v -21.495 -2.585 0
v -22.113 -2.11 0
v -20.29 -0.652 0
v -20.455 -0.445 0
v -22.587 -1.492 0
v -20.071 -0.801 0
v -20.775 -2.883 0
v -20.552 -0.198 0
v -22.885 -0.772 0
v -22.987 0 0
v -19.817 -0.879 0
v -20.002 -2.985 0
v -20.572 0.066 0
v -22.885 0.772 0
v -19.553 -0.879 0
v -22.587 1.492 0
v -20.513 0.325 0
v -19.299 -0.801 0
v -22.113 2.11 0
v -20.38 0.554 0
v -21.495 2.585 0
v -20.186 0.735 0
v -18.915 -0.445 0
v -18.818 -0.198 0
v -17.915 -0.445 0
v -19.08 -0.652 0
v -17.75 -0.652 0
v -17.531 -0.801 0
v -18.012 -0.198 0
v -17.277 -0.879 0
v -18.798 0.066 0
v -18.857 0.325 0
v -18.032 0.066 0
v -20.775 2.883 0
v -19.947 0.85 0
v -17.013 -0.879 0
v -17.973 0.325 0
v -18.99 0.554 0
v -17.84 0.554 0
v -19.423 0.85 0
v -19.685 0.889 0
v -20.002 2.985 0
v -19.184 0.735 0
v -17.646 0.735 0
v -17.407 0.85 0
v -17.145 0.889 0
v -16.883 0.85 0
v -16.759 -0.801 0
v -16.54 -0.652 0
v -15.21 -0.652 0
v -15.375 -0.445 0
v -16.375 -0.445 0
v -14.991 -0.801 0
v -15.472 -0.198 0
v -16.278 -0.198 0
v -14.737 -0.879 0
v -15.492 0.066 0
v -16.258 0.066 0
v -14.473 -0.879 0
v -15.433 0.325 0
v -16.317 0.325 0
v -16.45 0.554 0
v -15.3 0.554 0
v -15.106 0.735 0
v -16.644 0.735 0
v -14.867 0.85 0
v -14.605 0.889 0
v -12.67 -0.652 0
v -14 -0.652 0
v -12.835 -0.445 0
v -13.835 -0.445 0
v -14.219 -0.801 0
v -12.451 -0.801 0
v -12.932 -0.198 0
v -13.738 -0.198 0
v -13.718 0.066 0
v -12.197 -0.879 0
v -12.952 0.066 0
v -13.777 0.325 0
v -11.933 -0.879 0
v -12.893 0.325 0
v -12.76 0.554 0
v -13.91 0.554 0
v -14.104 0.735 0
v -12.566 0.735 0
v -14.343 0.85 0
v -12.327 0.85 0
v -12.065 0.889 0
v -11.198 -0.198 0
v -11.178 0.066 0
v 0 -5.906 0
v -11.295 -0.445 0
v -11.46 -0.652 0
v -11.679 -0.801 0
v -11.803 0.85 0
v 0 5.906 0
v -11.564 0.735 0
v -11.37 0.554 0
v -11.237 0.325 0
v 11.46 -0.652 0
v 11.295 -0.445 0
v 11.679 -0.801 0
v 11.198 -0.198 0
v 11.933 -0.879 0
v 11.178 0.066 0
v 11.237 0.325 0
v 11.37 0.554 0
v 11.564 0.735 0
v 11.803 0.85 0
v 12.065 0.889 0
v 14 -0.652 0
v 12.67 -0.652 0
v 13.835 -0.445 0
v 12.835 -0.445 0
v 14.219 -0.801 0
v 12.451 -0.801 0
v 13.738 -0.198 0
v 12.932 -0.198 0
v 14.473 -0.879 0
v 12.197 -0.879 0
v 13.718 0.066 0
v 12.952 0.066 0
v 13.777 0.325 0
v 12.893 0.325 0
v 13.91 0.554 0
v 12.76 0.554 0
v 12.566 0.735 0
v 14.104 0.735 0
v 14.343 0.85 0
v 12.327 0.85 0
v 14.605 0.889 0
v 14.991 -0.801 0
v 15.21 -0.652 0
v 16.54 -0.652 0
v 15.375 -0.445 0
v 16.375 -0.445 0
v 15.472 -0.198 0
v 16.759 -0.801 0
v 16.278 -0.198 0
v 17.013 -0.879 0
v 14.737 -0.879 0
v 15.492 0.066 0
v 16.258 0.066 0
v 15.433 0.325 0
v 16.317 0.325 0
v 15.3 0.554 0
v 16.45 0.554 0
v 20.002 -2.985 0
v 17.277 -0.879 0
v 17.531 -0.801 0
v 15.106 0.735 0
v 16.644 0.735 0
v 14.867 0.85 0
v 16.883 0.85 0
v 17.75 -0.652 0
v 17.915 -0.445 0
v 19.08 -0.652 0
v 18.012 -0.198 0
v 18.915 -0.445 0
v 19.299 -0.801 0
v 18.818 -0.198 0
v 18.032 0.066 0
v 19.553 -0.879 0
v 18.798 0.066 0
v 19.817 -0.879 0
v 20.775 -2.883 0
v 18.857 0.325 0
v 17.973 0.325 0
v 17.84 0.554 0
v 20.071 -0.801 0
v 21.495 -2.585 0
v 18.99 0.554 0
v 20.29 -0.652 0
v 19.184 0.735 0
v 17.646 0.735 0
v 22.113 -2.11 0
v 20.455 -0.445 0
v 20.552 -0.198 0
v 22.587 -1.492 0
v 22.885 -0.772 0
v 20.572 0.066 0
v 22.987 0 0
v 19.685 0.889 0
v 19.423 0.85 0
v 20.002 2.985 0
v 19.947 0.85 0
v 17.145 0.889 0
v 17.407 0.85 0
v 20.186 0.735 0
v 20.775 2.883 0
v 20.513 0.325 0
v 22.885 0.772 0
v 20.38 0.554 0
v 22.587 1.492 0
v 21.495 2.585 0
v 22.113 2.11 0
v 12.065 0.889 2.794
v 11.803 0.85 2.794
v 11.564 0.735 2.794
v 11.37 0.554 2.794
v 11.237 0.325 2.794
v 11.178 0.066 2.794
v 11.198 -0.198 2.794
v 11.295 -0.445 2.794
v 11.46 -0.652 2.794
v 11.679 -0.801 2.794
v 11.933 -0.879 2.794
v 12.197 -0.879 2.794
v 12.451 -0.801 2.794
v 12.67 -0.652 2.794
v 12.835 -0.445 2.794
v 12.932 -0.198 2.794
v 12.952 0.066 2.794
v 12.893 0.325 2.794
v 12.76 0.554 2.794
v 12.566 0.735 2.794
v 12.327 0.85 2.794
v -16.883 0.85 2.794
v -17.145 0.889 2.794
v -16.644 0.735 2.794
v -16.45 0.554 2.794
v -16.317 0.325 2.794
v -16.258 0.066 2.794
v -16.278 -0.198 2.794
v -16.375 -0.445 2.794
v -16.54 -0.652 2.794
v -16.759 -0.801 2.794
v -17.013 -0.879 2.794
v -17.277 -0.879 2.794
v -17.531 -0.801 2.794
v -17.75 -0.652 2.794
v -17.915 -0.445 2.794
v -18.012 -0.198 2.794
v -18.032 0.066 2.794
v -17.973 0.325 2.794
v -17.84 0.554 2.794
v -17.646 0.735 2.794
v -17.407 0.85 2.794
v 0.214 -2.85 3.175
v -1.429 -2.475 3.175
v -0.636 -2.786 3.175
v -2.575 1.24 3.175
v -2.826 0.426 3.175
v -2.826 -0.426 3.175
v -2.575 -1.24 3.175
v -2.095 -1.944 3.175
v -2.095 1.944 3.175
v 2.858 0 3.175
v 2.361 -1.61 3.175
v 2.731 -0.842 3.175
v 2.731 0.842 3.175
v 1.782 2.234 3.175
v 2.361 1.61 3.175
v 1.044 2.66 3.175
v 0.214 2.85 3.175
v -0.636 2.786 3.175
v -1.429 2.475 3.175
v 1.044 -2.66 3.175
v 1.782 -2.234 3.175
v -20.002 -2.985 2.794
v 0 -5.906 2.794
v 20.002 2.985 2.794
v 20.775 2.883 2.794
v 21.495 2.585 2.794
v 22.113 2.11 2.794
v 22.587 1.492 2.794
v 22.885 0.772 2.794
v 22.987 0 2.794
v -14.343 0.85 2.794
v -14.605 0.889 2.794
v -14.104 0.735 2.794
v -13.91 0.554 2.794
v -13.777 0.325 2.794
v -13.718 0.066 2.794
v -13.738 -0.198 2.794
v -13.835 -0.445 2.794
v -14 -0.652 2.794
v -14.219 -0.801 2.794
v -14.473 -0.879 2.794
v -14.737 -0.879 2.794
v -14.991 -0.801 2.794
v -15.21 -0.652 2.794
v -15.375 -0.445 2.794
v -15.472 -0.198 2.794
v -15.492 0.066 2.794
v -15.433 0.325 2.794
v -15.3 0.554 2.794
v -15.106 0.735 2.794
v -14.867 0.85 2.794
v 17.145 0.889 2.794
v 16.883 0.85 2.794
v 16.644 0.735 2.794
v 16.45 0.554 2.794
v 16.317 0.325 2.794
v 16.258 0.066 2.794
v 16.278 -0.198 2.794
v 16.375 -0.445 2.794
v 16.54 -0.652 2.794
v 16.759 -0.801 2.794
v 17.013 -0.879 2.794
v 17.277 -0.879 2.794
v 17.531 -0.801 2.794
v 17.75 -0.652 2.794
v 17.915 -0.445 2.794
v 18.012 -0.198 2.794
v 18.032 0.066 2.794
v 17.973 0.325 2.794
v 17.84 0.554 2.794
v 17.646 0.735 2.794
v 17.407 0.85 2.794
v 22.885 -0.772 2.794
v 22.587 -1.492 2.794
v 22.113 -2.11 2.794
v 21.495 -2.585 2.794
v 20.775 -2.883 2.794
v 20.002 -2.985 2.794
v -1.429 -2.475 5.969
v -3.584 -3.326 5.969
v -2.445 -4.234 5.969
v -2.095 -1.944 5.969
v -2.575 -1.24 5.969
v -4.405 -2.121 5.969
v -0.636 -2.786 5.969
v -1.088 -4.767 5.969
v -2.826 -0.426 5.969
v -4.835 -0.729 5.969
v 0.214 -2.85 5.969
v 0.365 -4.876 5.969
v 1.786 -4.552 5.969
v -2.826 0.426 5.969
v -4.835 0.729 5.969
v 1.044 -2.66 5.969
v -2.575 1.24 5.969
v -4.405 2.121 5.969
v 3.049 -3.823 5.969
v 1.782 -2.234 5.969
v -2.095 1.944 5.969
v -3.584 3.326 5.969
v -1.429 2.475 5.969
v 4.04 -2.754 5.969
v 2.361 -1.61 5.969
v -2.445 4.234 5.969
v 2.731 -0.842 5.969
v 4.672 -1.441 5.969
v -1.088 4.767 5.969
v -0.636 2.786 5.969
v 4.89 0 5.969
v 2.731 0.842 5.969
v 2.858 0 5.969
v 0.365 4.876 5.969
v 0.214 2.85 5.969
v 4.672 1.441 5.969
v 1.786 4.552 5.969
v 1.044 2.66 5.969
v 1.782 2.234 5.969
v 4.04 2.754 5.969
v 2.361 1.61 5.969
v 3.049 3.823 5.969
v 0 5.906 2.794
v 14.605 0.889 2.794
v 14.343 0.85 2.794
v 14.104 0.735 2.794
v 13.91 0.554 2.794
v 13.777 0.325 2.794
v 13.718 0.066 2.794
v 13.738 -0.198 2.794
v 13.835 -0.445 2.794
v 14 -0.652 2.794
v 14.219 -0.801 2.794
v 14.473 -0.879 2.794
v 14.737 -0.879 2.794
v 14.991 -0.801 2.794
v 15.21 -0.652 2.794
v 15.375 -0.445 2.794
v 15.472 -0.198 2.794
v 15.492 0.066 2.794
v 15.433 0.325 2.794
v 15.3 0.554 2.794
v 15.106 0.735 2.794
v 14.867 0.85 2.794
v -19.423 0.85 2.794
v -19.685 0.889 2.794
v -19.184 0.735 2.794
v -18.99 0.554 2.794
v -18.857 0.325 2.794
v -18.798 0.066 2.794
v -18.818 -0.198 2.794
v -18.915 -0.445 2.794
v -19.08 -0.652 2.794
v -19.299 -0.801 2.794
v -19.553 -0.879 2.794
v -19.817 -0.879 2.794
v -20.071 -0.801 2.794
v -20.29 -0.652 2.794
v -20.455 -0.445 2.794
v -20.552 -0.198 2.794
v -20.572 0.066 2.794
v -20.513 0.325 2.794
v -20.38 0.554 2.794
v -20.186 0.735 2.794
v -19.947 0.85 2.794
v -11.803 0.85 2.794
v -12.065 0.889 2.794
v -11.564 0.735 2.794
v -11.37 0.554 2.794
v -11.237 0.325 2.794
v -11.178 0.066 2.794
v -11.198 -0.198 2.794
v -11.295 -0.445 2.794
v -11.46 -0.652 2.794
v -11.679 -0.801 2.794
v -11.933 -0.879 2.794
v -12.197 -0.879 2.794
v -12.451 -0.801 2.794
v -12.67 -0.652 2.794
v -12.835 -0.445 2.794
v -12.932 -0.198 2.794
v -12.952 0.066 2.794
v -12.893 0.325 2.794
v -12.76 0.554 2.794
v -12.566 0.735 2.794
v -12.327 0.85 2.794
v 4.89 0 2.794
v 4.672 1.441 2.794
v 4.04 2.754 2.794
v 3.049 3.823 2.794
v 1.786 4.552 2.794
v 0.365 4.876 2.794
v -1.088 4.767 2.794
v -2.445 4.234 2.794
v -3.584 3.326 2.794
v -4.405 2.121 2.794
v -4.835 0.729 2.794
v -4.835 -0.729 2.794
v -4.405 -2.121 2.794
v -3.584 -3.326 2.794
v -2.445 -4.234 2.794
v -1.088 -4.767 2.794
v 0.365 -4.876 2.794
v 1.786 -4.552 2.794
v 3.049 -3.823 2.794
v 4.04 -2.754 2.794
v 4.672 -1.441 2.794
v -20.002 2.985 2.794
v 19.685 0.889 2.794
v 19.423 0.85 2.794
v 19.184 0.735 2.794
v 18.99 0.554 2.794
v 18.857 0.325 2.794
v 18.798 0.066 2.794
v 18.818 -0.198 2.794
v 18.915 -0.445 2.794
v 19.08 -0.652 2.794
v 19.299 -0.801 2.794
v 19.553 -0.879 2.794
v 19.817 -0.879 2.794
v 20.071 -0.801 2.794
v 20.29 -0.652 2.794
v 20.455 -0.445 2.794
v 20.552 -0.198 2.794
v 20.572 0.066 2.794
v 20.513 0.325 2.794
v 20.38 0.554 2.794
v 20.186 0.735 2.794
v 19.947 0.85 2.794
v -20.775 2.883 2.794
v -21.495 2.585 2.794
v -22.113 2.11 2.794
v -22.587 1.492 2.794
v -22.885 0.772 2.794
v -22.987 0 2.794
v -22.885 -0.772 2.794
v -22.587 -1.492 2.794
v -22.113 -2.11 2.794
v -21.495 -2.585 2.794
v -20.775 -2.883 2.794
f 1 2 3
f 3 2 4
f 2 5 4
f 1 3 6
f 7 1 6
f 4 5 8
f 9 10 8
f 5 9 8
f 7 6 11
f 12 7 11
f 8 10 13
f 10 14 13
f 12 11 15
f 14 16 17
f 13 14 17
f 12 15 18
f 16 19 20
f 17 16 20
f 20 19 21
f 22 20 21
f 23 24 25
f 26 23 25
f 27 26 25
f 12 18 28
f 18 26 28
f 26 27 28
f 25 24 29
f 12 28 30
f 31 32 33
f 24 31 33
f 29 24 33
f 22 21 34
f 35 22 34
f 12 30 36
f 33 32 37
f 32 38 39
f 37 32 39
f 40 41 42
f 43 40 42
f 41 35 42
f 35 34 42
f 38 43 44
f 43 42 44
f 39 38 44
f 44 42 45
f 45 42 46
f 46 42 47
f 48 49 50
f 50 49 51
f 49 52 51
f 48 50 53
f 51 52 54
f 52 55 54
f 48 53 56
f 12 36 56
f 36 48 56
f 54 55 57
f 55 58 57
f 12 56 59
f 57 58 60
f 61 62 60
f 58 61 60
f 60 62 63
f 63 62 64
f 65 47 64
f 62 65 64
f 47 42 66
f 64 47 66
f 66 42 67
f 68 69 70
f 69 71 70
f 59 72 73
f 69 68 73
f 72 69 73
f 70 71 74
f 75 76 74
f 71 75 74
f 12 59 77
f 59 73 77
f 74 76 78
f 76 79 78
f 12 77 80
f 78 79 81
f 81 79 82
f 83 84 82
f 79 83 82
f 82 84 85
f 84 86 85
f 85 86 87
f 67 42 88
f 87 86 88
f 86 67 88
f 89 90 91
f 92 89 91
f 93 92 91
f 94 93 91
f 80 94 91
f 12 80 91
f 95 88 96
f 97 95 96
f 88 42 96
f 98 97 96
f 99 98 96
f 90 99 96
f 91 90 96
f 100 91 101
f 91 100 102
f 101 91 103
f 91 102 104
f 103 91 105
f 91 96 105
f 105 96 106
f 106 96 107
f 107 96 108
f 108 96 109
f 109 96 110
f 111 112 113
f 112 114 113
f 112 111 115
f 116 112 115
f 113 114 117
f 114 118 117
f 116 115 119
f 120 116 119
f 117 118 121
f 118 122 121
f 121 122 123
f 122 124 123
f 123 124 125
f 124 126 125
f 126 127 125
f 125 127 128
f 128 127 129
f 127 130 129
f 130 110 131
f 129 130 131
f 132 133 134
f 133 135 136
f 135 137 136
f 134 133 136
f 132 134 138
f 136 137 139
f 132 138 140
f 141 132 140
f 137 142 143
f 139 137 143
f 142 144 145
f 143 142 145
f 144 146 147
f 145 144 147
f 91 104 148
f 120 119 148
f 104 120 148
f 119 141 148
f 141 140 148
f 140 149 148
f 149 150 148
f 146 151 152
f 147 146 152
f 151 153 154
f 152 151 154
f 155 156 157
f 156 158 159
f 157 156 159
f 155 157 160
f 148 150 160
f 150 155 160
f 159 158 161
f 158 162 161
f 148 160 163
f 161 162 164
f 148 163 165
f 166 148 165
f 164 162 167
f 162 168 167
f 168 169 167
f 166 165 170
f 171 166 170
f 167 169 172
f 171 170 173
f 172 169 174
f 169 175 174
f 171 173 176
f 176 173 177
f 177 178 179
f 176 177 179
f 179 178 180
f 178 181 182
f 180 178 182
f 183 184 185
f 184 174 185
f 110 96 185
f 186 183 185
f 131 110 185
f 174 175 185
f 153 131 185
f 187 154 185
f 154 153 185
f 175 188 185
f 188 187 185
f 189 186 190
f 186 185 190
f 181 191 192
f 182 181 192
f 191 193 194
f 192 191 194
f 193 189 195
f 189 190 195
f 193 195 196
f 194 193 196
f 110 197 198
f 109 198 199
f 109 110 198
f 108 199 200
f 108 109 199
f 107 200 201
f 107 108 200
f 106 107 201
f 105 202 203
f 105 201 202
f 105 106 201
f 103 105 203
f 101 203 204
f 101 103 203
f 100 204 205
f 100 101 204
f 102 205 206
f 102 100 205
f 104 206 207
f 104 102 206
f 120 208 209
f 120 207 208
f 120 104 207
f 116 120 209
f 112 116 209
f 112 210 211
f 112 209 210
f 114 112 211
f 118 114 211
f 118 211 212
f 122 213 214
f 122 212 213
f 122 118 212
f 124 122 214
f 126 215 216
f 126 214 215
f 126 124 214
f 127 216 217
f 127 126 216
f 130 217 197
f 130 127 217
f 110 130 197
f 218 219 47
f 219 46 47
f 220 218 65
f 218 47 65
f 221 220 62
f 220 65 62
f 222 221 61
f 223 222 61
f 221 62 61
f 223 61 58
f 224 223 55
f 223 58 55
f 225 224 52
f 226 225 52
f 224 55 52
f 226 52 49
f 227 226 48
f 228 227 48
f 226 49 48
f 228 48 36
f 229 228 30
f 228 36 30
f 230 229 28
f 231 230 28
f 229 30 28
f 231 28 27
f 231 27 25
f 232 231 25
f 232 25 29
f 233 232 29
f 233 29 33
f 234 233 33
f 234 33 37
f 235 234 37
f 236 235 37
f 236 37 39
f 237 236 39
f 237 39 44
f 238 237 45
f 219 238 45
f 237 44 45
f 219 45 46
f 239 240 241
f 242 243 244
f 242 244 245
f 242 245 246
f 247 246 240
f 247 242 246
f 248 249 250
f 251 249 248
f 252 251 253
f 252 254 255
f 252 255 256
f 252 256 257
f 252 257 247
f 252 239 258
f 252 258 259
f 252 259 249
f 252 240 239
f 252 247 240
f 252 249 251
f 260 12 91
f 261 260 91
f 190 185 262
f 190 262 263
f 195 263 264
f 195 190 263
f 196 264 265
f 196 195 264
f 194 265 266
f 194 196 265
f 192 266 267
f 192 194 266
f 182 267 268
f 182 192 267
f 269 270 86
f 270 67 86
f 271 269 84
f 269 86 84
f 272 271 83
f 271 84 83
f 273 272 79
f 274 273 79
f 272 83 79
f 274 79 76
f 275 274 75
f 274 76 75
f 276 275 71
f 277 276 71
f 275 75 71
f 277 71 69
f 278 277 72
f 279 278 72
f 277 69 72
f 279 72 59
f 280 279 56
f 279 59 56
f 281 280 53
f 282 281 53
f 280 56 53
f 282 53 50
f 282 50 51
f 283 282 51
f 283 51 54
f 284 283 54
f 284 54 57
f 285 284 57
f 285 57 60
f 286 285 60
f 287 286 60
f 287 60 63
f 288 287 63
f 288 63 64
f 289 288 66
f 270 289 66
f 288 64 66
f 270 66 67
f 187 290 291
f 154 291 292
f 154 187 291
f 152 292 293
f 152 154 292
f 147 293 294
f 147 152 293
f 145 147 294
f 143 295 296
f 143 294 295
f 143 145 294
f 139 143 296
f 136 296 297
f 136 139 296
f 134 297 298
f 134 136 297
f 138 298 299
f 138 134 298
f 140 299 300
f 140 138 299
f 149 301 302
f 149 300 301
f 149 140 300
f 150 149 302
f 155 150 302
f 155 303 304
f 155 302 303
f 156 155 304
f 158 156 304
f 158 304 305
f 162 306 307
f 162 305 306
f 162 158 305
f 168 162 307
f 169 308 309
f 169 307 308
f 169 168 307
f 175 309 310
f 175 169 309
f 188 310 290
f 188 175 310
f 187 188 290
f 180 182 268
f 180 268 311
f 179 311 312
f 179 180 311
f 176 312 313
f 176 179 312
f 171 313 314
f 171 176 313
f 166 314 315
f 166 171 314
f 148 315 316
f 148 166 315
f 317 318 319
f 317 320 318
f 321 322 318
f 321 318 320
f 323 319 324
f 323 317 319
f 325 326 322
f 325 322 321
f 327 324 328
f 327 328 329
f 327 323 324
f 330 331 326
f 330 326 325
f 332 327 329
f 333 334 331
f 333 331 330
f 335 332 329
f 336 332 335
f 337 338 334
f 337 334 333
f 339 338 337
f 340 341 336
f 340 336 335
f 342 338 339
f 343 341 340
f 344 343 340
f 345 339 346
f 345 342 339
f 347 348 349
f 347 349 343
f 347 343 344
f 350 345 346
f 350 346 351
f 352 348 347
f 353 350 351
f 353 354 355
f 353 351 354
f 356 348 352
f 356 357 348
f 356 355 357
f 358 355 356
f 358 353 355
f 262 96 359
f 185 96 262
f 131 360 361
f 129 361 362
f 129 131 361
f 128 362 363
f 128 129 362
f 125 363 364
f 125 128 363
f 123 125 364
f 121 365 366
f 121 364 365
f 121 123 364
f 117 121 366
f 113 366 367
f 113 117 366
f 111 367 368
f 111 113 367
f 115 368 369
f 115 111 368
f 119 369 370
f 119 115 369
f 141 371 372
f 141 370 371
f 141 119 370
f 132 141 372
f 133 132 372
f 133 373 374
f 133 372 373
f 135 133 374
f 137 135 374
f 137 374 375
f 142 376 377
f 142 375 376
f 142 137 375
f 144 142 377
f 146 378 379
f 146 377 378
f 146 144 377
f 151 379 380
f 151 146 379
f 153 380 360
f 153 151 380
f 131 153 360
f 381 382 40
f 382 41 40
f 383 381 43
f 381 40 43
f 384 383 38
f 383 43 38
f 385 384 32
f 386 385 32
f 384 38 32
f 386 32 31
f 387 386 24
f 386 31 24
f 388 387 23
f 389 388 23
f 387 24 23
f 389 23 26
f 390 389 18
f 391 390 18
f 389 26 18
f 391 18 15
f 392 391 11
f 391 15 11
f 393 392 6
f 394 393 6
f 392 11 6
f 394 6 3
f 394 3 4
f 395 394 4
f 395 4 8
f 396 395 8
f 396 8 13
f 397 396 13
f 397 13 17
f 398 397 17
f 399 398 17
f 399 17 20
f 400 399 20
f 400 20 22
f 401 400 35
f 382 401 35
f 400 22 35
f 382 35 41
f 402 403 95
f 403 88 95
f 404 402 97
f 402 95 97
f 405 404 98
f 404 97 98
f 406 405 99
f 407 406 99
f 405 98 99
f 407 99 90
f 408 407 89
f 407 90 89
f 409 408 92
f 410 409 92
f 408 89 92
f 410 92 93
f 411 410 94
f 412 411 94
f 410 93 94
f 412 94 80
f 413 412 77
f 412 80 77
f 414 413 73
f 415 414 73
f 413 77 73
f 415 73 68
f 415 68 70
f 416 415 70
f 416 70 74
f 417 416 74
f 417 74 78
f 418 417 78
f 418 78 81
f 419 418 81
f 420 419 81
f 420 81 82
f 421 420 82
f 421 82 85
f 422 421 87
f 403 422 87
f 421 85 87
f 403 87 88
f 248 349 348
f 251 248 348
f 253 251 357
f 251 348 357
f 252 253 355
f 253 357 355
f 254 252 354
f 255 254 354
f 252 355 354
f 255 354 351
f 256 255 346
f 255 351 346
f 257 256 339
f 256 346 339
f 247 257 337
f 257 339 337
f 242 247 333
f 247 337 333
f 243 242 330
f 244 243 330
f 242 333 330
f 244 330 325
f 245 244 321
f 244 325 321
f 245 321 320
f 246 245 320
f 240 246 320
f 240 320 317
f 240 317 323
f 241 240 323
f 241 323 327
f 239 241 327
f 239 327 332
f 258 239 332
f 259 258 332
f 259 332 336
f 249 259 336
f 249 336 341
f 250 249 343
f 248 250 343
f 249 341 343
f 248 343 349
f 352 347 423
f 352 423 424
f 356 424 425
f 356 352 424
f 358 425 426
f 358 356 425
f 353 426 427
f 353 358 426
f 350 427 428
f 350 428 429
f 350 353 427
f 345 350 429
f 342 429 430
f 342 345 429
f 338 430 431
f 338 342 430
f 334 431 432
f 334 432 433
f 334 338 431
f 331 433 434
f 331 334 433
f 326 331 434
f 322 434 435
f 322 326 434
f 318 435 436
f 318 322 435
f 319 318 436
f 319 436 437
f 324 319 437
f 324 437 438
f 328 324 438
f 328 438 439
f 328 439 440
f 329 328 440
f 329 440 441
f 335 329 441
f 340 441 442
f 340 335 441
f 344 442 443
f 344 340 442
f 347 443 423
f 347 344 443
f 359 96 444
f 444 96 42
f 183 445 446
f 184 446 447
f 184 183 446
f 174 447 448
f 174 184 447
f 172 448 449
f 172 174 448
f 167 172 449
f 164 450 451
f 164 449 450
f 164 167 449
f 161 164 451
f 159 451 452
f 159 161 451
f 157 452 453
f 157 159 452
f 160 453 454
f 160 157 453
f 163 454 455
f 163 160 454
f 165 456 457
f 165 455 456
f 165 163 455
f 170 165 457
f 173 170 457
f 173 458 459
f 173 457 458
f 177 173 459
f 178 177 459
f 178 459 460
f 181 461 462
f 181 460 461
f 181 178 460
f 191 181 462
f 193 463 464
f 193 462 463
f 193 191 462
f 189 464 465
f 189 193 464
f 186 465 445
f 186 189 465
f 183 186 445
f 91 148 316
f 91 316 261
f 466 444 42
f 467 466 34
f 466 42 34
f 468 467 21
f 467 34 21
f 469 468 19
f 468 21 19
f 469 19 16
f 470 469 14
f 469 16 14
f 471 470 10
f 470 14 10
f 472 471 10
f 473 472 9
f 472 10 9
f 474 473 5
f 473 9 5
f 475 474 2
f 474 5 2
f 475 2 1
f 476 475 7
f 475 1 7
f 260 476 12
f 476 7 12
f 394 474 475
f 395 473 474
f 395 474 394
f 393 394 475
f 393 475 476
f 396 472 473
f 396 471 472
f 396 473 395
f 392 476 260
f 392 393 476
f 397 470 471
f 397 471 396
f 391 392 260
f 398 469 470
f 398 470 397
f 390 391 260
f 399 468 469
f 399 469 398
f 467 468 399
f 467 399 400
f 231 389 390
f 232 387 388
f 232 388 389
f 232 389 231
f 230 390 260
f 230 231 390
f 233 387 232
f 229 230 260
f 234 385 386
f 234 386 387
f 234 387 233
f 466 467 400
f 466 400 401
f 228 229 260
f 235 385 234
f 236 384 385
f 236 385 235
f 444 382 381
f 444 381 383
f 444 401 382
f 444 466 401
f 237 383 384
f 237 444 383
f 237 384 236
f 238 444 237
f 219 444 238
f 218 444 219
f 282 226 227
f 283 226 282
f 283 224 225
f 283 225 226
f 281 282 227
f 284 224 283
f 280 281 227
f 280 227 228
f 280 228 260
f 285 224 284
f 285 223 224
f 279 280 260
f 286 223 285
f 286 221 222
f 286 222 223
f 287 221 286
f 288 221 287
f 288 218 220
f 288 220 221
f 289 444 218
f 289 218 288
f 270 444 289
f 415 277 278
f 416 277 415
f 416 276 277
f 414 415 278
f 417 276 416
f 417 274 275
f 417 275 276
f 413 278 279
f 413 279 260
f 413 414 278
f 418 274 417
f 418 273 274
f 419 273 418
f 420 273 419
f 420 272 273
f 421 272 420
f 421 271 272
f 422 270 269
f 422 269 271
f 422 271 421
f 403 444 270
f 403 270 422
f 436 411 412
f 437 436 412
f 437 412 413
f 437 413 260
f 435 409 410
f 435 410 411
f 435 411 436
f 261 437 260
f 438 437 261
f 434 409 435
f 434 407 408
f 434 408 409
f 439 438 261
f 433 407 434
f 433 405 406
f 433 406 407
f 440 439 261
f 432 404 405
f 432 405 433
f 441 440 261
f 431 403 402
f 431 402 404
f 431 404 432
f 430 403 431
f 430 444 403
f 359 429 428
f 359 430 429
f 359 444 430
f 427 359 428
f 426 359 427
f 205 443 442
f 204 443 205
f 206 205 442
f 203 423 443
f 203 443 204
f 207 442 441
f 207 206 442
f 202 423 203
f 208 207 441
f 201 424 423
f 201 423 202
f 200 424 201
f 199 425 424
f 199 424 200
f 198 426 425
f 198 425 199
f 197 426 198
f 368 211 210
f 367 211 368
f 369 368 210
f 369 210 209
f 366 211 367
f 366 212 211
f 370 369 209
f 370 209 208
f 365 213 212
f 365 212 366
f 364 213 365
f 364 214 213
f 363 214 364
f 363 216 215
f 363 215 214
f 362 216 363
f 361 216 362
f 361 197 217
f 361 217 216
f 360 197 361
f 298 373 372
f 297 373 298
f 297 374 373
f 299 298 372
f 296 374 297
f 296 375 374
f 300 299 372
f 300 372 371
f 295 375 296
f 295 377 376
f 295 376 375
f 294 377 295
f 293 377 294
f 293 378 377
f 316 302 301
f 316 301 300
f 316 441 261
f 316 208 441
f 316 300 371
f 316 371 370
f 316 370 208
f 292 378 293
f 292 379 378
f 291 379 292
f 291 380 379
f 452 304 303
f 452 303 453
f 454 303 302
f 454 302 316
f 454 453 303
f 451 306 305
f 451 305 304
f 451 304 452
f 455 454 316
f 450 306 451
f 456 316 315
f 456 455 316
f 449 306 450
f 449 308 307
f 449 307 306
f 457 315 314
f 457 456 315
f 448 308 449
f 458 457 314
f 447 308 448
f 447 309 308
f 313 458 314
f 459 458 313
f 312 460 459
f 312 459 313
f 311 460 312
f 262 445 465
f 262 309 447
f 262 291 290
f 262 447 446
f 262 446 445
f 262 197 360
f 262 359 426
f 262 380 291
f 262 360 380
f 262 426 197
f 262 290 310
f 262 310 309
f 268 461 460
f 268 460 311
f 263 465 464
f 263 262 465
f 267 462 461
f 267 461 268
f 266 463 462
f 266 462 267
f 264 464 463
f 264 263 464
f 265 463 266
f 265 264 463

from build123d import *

# Parameters (mm, degrees)
SKETCH1_W         = 45.974
SKETCH1_H         = 11.811
EXTRUDE1_DEPTH    = 5.969
SKETCH2_OUTSIDE_W = 57.542
SKETCH2_OUTSIDE_H = 23.379
SKETCH2_OUTSIDE_R = 4.8895
EXTRUDE2_DEPTH    = 3.175
SKETCH3_R         = 2.8575
EXTRUDE3_DEPTH    = 2.794
LPATTERN1_COUNT   = 4
LPATTERN1_PITCH   = 2.54
EXTRUDE4_DEPTH    = 6.969


with BuildPart() as part:
    # Sketch1 → Extrude1 (new body)
    with BuildSketch(Plane.XY):
        Rectangle(SKETCH1_W, SKETCH1_H)
    extrude(amount=EXTRUDE1_DEPTH)

    # Sketch2 outside → Extrude2 (cut)
    with BuildSketch(Plane.XY.offset(5.969)):
        with Locations((0, -0.0005)):
            Rectangle(SKETCH2_OUTSIDE_W, SKETCH2_OUTSIDE_H)
        Circle(SKETCH2_OUTSIDE_R, mode=Mode.SUBTRACT)
    extrude(amount=-EXTRUDE2_DEPTH, mode=Mode.SUBTRACT)

    # Sketch3 → Extrude3 (cut)
    with BuildSketch(Plane.XY.offset(5.969)):
        Circle(SKETCH3_R)
    extrude(amount=-EXTRUDE3_DEPTH, mode=Mode.SUBTRACT)

    # Sketch5 → #50 (0.07) Diameter Hole1 (revolve, cut)
    with BuildSketch(Plane.YZ.offset(12.065)):
        Polygon((0, 0), (0, 5.61416509), (0.889, 5.08), (0.889, 0), align=None)
    f_50_0_07_diameter_hole1 = revolve(axis=Axis((12.065, 0, -6.35), (0, 0, 1)), mode=Mode.SUBTRACT)

    # LPattern1: #50 (0.07) Diameter Hole1 ×4
    with Locations(*[(i * LPATTERN1_PITCH, 0, 0) for i in range(1, LPATTERN1_COUNT)]):
        add(f_50_0_07_diameter_hole1, mode=Mode.SUBTRACT)

    # Mirror1: #50 (0.07) Diameter Hole1 across plane
    add(f_50_0_07_diameter_hole1.mirror(Plane(origin=(0, 0, 0), x_dir=(0, 0, 1), z_dir=(1, 0, 0))), mode=Mode.SUBTRACT)

    # Mirror1 copy 1 sketch → Mirror1 copy 1 (revolve, cut)
    with BuildSketch(Plane(origin=(-14.605, 0, 0), x_dir=(0, 1, 0), z_dir=(-1, 0, 0))):
        Polygon((0, 0), (0, -5.61416509), (0.889, -5.08), (0.889, 0), align=None)
    revolve(axis=Axis((-14.605, 0, -6.35), (0, 0, -1)), mode=Mode.SUBTRACT)

    # Mirror1 copy 2 sketch → Mirror1 copy 2 (revolve, cut)
    with BuildSketch(Plane(origin=(-17.145, 0, 0), x_dir=(0, 1, 0), z_dir=(-1, 0, 0))):
        Polygon((0, 0), (0, -5.61416509), (0.889, -5.08), (0.889, 0), align=None)
    revolve(axis=Axis((-17.145, 0, -6.35), (0, 0, -1)), mode=Mode.SUBTRACT)

    # Mirror1 copy 3 sketch → Mirror1 copy 3 (revolve, cut)
    with BuildSketch(Plane(origin=(-19.685, 0, 0), x_dir=(0, 1, 0), z_dir=(-1, 0, 0))):
        Polygon((0, 0), (0, -5.61416509), (0.889, -5.08), (0.889, 0), align=None)
    revolve(axis=Axis((-19.685, 0, -6.35), (0, 0, -1)), mode=Mode.SUBTRACT)

    # Sketch6 → Extrude4 (cut, through all)
    with BuildSketch(Plane(origin=(0, 0, 0), x_dir=(-1, 0, 0), z_dir=(0, 0, -1))):
        with BuildLine():
            Line((-61.04017999, 14.819304062), (0, 5.9055))
            Line((0, 5.9055), (20.0025, 2.9845))
            ThreePointArc((20.0025, 2.9845), (22.112860188, 2.110360188), (22.987, 0))
            ThreePointArc((22.987, 0), (22.112860188, -2.110360188), (20.0025, -2.9845))
            Line((20.0025, -2.9845), (0, -5.9055))
            Line((0, -5.9055), (-61.04017999, -14.819304062))
            Line((-61.04017999, -14.819304062), (62.335011618, -14.819304062))
            Line((62.335011618, -14.819304062), (62.335011618, 14.819304062))
            Line((62.335011618, 14.819304062), (-61.04017999, 14.819304062))
        make_face()
    extrude4 = extrude(amount=-EXTRUDE4_DEPTH, mode=Mode.SUBTRACT)

    # Mirror2: Extrude4 across plane
    add(extrude4.mirror(Plane(origin=(0, 0, 0), x_dir=(0, 0, 1), z_dir=(1, 0, 0))), mode=Mode.SUBTRACT)


solid = part.part
